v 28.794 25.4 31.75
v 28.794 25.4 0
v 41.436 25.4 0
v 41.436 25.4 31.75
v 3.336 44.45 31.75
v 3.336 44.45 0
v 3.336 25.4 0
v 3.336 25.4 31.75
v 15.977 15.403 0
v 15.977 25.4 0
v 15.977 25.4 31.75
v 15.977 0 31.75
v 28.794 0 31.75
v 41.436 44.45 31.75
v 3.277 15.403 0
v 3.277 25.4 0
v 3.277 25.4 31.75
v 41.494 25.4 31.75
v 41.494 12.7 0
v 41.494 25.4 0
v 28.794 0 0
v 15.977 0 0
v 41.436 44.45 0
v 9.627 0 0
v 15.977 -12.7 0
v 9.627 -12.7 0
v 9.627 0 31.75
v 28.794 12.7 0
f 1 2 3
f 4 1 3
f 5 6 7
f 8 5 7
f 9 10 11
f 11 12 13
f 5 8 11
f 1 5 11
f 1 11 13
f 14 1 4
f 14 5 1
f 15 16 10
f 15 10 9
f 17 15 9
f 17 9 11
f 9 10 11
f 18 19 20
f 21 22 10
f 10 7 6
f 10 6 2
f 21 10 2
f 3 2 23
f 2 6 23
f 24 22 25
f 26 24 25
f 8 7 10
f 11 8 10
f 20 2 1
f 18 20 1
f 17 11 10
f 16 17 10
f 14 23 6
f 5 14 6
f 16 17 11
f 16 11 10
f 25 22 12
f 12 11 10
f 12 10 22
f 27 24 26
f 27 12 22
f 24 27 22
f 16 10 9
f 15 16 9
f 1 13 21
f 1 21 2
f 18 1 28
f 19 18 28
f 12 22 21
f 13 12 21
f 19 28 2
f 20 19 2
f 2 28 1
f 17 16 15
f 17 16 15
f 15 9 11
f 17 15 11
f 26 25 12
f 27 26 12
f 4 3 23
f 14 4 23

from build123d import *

# Parameters (mm, degrees)
F1_DEPTH = 31.75
F3_DEPTH = 12.7
F5_DEPTH = 12.7
F7_DEPTH = 6.35


with BuildPart() as f1:
    # F0 (on Top) → F1 (new body)
    with BuildSketch(Plane.XY):
        Polygon((15.9774183193, 25.4), (15.9774183193, 0), (28.7944694649, 0), (28.7944694649, 25.4), (41.4359450386, 25.4), (41.4359450386, 44.45), (3.3359450386, 44.45), (3.3359450386, 25.4), align=None)
    extrude(amount=F1_DEPTH)


with BuildPart() as f3:
    # F2 (on face) → F3 (new body)
    with BuildSketch(Plane(origin=(15.9774183193, 0, 0), x_dir=(0, -1, 0), z_dir=(-1, 0, 0))):
        Polygon((-15.4029941186, 0), (-25.4, 31.75), (-25.4, 0), align=None)
    extrude(amount=F3_DEPTH)


with BuildPart() as f5:
    # F4 (on face) + F3_face (on face) → F5 (new body)
    with BuildSketch(Plane.YZ.offset(28.7944694649)):
        Polygon((25.4, 0), (25.4, 31.75), (12.7, 0), align=None)
    with BuildSketch(Plane(origin=(3.2774183193, 22.0676647062, 10.5833333333), x_dir=(0, -1, 0), z_dir=(-1, 0, 0))):
        Polygon((6.6646705876, -10.5833333333), (-3.3323352938, 21.1666666667), (-3.3323352938, -10.5833333333), align=None)
    extrude(amount=F5_DEPTH, dir=(1, 0, 0))


with BuildPart() as f7:
    # F6 (on face) → F7 (new body)
    with BuildSketch(Plane(origin=(15.9774183193, 0, 0), x_dir=(0, -1, 0), z_dir=(-1, 0, 0))):
        Polygon((12.7, 0), (0, 31.75), (0, 0), align=None)
    extrude(amount=F7_DEPTH)


solid = Compound([f1.part, f3.part, f5.part, f7.part])
